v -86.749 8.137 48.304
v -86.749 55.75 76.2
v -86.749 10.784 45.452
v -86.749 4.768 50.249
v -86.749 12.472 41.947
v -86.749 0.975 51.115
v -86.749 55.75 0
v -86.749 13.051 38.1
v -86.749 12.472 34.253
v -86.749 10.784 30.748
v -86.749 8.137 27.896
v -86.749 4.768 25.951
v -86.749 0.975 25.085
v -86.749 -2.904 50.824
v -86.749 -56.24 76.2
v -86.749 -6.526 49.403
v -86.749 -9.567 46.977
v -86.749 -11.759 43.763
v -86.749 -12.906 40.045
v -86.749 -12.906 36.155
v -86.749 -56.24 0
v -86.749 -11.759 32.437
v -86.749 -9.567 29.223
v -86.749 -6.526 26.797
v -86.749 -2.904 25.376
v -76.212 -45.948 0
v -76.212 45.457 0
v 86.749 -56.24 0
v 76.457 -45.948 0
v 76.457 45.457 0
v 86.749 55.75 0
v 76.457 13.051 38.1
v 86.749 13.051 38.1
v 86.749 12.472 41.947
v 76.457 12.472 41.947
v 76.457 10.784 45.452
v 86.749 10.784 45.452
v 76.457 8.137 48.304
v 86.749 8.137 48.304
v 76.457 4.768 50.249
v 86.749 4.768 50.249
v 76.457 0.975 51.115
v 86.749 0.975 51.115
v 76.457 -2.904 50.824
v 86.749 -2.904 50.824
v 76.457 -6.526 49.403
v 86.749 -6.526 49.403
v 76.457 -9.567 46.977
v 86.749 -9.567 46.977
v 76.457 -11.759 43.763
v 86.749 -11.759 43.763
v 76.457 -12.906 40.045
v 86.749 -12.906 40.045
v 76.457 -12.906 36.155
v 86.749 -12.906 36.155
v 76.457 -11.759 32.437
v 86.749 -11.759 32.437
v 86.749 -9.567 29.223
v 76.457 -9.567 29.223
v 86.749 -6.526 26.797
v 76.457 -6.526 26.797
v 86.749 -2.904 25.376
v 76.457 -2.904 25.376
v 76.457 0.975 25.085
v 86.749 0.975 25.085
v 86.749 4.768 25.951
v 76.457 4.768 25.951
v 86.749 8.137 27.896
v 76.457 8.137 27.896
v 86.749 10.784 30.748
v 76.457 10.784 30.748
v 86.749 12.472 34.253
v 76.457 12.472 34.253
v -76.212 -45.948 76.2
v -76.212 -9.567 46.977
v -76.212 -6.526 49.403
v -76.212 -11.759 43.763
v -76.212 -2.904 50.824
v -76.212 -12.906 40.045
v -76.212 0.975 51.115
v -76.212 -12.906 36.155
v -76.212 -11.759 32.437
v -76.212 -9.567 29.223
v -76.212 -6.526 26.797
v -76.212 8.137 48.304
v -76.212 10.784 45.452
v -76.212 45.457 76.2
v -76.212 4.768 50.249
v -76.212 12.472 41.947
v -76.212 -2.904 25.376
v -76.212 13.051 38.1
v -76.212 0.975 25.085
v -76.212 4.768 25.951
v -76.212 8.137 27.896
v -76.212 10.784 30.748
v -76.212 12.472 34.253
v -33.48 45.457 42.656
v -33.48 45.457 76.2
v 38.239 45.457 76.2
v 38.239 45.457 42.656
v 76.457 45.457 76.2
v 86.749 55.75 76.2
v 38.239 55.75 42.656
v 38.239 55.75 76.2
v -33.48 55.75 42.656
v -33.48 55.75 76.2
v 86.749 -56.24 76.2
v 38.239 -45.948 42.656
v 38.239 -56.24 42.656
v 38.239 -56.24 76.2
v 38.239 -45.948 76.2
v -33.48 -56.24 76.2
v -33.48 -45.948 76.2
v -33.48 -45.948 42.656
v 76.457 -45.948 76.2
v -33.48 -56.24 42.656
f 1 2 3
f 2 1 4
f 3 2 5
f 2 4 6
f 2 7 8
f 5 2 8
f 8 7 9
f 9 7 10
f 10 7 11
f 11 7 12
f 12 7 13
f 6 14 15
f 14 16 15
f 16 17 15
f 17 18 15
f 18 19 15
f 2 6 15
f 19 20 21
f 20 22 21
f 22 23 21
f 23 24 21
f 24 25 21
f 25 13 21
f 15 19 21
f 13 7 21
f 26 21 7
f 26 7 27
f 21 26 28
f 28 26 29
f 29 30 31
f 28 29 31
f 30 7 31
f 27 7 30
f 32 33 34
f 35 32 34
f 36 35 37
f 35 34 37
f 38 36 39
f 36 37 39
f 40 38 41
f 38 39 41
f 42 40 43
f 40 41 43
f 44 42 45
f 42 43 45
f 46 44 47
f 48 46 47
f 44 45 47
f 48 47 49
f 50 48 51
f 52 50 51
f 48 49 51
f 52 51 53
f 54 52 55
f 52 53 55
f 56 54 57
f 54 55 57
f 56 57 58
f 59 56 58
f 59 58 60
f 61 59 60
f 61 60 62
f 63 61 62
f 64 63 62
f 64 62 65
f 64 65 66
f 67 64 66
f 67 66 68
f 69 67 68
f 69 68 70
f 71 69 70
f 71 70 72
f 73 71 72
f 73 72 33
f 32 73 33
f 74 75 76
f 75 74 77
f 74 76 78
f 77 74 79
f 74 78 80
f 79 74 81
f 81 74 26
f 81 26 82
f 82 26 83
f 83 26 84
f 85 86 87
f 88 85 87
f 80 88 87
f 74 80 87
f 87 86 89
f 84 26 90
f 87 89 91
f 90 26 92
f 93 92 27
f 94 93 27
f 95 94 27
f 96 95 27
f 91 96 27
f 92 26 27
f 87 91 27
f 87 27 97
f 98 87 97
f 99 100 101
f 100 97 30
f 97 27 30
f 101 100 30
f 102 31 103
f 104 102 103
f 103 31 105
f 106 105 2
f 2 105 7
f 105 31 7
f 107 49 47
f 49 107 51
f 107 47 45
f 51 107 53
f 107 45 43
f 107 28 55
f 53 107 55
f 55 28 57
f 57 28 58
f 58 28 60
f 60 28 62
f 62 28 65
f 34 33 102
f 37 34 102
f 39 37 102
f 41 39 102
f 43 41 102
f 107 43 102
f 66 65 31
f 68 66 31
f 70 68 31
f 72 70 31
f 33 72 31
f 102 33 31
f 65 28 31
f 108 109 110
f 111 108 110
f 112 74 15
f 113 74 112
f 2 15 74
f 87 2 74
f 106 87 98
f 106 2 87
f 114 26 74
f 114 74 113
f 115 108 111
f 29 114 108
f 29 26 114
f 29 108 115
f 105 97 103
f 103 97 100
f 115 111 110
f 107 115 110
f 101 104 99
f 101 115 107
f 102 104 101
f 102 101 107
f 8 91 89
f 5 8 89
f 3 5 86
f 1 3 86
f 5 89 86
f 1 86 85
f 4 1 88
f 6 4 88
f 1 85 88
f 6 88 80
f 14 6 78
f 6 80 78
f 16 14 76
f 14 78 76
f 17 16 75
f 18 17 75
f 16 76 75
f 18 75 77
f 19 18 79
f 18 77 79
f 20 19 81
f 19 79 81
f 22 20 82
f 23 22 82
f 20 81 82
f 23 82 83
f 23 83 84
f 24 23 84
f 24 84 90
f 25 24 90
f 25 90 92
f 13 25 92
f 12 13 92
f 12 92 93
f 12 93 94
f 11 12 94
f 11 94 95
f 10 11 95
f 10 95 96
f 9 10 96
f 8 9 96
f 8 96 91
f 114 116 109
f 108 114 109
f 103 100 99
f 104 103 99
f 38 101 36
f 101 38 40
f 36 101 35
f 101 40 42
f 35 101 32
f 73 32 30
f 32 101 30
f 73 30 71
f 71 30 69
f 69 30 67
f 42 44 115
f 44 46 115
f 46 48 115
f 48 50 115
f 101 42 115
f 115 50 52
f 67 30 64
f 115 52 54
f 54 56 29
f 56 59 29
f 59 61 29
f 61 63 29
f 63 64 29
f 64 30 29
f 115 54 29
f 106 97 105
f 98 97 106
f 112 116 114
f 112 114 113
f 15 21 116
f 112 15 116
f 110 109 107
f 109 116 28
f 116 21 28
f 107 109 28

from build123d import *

# Parameters (mm, degrees)
F0_W     = 10.5373039842
F0_H     = 91.4049893618
F0_W_2   = 152.6683866978
F0_H_2   = 10.2922543883
F0_W_3   = 10.2922543883
F1_DEPTH = 76.2
F2_W     = 38.2388904691
F2_H     = 33.5443941772
F2_W_2   = 33.4795936942
F3_DEPTH = 111.9904981384
F4_R     = 13.0513622492
F5_DEPTH = 173.4989450703


with BuildPart() as f1:
    # F0 (on Top) → F1 (new body)
    with BuildSketch(Plane.XY):
        with Locations((-81.4803205431, -0.2450533211)):
            Rectangle(F0_W, F0_H)
        with Locations((0.1225247979, 50.6035685539)):
            Rectangle(F0_W_2, F0_H_2)
        with Locations((-81.4803205431, 50.6035685539)):
            Rectangle(F0_W, F0_H_2)
        with Locations((81.602845341, 50.6035685539)):
            Rectangle(F0_W_3, F0_H_2)
        with Locations((81.602845341, -0.2450533211)):
            Rectangle(F0_W_3, F0_H)
        with Locations((81.602845341, -51.0936751962)):
            Rectangle(F0_W_3, F0_H_2)
        with Locations((0.1225247979, -51.0936751962)):
            Rectangle(F0_W_2, F0_H_2)
        with Locations((-81.4803205431, -51.0936751962)):
            Rectangle(F0_W, F0_H_2)
    extrude(amount=F1_DEPTH)

    # F2 (on face) → F3 (cut, through all)
    with BuildSketch(Plane.XZ.offset(56.2398023903)):
        with Locations((19.1194452345, 59.4278029114)):
            Rectangle(F2_W, F2_H)
        with Locations((-16.7397968471, 59.4278029114)):
            Rectangle(F2_W_2, F2_H)
    extrude(amount=-F3_DEPTH, mode=Mode.SUBTRACT)

    # F4 (on face) → F5 (cut, through all)
    with BuildSketch(Plane.YZ.offset(86.7489725351)):
        with Locations((0, 38.1)):
            Circle(F4_R)
    extrude(amount=-F5_DEPTH, mode=Mode.SUBTRACT)


solid = f1.part
